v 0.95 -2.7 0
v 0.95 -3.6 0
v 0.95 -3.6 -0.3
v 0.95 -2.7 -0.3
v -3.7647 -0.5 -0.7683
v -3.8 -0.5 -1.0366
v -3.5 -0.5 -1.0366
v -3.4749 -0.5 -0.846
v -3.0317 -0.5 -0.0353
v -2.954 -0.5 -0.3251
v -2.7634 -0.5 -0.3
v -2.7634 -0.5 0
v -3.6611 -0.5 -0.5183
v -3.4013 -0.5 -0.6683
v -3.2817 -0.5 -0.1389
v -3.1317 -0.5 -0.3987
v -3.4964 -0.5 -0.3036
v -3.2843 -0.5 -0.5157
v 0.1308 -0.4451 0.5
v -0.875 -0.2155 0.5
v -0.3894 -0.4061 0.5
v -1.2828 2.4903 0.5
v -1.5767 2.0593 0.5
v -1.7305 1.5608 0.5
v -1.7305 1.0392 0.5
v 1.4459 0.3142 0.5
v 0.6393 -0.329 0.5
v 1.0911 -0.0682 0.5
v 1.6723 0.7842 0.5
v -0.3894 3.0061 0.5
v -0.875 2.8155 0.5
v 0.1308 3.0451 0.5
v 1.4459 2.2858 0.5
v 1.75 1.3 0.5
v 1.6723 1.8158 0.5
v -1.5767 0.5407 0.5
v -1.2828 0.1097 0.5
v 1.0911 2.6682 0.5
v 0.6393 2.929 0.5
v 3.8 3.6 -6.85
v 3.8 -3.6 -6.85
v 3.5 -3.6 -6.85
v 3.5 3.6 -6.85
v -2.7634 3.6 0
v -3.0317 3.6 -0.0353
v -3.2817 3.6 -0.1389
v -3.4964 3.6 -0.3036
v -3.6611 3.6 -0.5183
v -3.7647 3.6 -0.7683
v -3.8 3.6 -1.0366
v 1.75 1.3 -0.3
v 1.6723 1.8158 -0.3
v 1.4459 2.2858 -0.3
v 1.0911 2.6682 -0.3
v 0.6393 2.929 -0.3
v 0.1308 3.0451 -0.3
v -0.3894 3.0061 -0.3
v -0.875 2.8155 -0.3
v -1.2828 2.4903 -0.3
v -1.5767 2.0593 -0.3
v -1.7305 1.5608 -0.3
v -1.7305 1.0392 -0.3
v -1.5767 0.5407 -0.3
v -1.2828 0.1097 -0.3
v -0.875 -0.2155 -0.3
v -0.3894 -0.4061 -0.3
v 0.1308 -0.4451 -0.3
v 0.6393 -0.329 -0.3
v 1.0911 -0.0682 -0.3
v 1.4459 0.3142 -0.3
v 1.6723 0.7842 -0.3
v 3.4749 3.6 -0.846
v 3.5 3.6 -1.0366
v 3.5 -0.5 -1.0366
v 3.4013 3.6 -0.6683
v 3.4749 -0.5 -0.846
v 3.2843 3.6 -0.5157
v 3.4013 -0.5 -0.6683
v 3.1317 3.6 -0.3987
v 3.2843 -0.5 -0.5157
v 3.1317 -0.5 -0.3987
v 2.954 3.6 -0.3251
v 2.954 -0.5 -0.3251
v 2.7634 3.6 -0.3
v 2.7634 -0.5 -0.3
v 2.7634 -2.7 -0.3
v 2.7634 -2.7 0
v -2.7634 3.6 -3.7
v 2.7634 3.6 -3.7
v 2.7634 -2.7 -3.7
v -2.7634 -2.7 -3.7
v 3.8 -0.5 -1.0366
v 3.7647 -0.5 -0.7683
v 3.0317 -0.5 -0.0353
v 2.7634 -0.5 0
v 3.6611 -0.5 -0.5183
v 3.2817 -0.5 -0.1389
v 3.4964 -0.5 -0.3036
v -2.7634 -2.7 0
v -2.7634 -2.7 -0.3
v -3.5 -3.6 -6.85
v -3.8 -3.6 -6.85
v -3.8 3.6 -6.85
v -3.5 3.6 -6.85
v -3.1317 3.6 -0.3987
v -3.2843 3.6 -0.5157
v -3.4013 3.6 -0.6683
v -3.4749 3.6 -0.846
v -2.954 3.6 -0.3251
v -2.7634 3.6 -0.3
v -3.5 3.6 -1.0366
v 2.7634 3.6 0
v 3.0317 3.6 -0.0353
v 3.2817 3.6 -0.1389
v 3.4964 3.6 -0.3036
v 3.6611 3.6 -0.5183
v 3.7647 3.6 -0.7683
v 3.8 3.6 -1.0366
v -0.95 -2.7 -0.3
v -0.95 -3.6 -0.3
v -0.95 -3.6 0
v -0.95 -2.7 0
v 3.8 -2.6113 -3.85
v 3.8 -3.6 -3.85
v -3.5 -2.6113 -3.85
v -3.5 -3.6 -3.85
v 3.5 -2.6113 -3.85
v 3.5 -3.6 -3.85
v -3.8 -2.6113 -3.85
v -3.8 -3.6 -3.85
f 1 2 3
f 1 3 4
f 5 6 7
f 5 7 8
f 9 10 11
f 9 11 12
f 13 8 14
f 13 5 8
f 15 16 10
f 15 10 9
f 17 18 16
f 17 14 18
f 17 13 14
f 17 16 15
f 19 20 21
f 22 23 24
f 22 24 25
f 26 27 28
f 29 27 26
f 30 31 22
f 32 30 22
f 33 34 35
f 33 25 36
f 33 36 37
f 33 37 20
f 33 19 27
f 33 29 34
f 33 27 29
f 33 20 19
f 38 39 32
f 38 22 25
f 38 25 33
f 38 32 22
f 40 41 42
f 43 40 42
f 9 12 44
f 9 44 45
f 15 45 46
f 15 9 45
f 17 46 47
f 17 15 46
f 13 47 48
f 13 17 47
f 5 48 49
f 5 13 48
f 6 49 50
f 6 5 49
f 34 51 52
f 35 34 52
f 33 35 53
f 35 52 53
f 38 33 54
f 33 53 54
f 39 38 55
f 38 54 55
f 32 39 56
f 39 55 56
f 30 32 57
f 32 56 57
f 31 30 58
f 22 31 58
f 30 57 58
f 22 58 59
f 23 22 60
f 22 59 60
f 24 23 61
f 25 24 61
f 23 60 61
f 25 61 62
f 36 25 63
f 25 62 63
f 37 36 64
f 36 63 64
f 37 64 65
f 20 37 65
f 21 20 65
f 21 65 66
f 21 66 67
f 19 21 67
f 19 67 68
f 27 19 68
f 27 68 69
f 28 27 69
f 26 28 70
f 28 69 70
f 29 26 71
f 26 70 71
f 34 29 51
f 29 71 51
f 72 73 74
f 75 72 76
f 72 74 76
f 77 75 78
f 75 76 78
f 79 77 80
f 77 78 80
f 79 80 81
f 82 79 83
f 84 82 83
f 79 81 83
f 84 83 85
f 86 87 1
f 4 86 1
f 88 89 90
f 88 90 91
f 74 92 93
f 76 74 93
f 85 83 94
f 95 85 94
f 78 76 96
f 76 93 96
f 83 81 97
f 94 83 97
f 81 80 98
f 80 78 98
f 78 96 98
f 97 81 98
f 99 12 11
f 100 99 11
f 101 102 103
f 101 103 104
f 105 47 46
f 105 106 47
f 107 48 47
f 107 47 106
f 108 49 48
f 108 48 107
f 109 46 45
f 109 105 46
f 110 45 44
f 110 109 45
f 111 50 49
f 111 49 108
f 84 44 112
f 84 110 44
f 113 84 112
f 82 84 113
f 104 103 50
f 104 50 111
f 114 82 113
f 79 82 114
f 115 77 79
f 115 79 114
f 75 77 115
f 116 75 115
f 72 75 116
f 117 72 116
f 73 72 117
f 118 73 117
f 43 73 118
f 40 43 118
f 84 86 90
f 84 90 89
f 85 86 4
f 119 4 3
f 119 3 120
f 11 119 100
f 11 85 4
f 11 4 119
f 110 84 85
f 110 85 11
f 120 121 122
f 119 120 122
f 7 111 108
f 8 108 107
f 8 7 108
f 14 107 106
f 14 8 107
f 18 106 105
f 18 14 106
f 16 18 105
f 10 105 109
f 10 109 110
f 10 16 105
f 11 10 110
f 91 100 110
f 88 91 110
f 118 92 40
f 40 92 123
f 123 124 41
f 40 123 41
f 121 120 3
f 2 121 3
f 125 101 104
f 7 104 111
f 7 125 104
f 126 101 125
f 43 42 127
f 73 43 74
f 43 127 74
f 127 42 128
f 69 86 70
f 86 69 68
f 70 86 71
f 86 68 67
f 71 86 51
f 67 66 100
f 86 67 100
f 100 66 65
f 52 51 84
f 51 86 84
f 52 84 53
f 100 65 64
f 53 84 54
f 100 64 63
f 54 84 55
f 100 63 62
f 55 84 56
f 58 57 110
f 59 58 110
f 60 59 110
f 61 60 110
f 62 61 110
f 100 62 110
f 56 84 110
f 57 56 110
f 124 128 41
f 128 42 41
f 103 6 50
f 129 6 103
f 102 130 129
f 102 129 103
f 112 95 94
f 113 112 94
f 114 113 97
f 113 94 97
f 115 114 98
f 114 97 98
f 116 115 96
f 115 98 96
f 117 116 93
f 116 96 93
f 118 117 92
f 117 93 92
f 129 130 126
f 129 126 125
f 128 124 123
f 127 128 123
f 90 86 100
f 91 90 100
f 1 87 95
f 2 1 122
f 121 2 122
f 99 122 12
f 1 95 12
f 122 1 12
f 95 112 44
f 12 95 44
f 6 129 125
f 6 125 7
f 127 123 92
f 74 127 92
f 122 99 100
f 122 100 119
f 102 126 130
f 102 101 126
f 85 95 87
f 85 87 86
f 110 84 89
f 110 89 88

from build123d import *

# Parameters (mm, degrees)
SKETCH4_W                    = 3.8
SKETCH4_H                    = 7.2
BASE_FLANGE1_DEPTH           = 0.3
EDGE_FLANGE2_STRIP_W         = 2.6732
EDGE_FLANGE2_STRIP_H         = 0.3
EDGE_FLANGE2_STRIP_CUT_DEPTH = 7.2
EDGE_FLANGE2_DEPTH           = 7.2
SKETCH13_W                   = 1.8134
SKETCH13_H                   = 0.9
CUT_EXTRUDE1_DEPTH           = 0.3
CUT_EXTRUDE3_DEPTH           = 1.0366
SKETCH17_W                   = 5.5268
SKETCH17_H                   = 6.3
BOSS_EXTRUDE3_DEPTH          = 3.4
SKETCH18_R                   = 1.75
BOSS_EXTRUDE4_DEPTH          = 0.8


# Sheet-metal steps are written as plain solids
with BuildPart() as part:
    # Sketch4 → Base-Flange1 (new body)
    with BuildSketch(Plane.XY):
        with Locations((-1.9, 0)):
            Rectangle(SKETCH4_W, SKETCH4_H)
    extrude(amount=-BASE_FLANGE1_DEPTH)

    # Edge-Flange2 strip (across the edge) → Edge-Flange2 strip cut (cut)
    with BuildSketch(Plane(origin=(-3.8, -3.6, -0.3), x_dir=(1, 0, 0), z_dir=(0, 1, 0))):
        with Locations((-0.3, -0.15)):
            Rectangle(EDGE_FLANGE2_STRIP_W, EDGE_FLANGE2_STRIP_H)
    extrude(amount=EDGE_FLANGE2_STRIP_CUT_DEPTH, mode=Mode.SUBTRACT)

    # Edge-Flange2 section (across the edge) → Edge-Flange2 (add)
    with BuildSketch(Plane(origin=(-3.8, -3.6, -0.3), x_dir=(1, 0, 0), z_dir=(0, 1, 0))):
        with BuildLine():
            Line((0, 0.7366), (0, 6.55))
            Line((0, 6.55), (0.3, 6.55))
            Line((0.3, 6.55), (0.3, 0.7366))
            ThreePointArc((0.3, 0.7366), (0.515745145, 0.215745145), (1.0366, 0))
            Line((1.0366, 0), (1.0366, -0.3))
            ThreePointArc((1.0366, -0.3), (0.303613111, 0.003613111), (0, 0.7366))
        make_face()
    extrude(amount=EDGE_FLANGE2_DEPTH)

    # Sketch13 → Cut-Extrude1 (cut)
    with BuildSketch(Plane.XY):
        with Locations((-1.8567, -3.15)):
            Rectangle(SKETCH13_W, SKETCH13_H)
    extrude(amount=-CUT_EXTRUDE1_DEPTH, mode=Mode.SUBTRACT)

    # Sketch14 → Cut-Extrude3 (cut)
    with BuildSketch(Plane.ZY.offset(3.8)):
        Polygon((0, -0.5), (0, -3.6), (-3.85, -3.6), (-3.85, -2.611331844), (-1.0366, -0.5), align=None)
    extrude(amount=-CUT_EXTRUDE3_DEPTH, mode=Mode.SUBTRACT)

    # Mirror3: part across plane


with BuildPart() as part_1:
    add(part.part)
    add(part.part.mirror(Plane(origin=(0, -3.6, -0.3), x_dir=(0, 0, 1), z_dir=(1, 0, 0))))


with BuildPart() as body_2:
    # Sketch17 → Boss-Extrude3 (new body)
    with BuildSketch(Plane(origin=(0, 0, -0.3), x_dir=(-1, 0, 0), z_dir=(0, 0, -1))):
        with Locations((0, 0.45)):
            Rectangle(SKETCH17_W, SKETCH17_H)
    extrude(amount=BOSS_EXTRUDE3_DEPTH)

    # Sketch18 → Boss-Extrude4 (add)
    with BuildSketch(Plane.XY.offset(-0.3)):
        with Locations((0, 1.3)):
            Circle(SKETCH18_R)
    extrude(amount=BOSS_EXTRUDE4_DEPTH)


solid = Compound([part_1.part, body_2.part])
